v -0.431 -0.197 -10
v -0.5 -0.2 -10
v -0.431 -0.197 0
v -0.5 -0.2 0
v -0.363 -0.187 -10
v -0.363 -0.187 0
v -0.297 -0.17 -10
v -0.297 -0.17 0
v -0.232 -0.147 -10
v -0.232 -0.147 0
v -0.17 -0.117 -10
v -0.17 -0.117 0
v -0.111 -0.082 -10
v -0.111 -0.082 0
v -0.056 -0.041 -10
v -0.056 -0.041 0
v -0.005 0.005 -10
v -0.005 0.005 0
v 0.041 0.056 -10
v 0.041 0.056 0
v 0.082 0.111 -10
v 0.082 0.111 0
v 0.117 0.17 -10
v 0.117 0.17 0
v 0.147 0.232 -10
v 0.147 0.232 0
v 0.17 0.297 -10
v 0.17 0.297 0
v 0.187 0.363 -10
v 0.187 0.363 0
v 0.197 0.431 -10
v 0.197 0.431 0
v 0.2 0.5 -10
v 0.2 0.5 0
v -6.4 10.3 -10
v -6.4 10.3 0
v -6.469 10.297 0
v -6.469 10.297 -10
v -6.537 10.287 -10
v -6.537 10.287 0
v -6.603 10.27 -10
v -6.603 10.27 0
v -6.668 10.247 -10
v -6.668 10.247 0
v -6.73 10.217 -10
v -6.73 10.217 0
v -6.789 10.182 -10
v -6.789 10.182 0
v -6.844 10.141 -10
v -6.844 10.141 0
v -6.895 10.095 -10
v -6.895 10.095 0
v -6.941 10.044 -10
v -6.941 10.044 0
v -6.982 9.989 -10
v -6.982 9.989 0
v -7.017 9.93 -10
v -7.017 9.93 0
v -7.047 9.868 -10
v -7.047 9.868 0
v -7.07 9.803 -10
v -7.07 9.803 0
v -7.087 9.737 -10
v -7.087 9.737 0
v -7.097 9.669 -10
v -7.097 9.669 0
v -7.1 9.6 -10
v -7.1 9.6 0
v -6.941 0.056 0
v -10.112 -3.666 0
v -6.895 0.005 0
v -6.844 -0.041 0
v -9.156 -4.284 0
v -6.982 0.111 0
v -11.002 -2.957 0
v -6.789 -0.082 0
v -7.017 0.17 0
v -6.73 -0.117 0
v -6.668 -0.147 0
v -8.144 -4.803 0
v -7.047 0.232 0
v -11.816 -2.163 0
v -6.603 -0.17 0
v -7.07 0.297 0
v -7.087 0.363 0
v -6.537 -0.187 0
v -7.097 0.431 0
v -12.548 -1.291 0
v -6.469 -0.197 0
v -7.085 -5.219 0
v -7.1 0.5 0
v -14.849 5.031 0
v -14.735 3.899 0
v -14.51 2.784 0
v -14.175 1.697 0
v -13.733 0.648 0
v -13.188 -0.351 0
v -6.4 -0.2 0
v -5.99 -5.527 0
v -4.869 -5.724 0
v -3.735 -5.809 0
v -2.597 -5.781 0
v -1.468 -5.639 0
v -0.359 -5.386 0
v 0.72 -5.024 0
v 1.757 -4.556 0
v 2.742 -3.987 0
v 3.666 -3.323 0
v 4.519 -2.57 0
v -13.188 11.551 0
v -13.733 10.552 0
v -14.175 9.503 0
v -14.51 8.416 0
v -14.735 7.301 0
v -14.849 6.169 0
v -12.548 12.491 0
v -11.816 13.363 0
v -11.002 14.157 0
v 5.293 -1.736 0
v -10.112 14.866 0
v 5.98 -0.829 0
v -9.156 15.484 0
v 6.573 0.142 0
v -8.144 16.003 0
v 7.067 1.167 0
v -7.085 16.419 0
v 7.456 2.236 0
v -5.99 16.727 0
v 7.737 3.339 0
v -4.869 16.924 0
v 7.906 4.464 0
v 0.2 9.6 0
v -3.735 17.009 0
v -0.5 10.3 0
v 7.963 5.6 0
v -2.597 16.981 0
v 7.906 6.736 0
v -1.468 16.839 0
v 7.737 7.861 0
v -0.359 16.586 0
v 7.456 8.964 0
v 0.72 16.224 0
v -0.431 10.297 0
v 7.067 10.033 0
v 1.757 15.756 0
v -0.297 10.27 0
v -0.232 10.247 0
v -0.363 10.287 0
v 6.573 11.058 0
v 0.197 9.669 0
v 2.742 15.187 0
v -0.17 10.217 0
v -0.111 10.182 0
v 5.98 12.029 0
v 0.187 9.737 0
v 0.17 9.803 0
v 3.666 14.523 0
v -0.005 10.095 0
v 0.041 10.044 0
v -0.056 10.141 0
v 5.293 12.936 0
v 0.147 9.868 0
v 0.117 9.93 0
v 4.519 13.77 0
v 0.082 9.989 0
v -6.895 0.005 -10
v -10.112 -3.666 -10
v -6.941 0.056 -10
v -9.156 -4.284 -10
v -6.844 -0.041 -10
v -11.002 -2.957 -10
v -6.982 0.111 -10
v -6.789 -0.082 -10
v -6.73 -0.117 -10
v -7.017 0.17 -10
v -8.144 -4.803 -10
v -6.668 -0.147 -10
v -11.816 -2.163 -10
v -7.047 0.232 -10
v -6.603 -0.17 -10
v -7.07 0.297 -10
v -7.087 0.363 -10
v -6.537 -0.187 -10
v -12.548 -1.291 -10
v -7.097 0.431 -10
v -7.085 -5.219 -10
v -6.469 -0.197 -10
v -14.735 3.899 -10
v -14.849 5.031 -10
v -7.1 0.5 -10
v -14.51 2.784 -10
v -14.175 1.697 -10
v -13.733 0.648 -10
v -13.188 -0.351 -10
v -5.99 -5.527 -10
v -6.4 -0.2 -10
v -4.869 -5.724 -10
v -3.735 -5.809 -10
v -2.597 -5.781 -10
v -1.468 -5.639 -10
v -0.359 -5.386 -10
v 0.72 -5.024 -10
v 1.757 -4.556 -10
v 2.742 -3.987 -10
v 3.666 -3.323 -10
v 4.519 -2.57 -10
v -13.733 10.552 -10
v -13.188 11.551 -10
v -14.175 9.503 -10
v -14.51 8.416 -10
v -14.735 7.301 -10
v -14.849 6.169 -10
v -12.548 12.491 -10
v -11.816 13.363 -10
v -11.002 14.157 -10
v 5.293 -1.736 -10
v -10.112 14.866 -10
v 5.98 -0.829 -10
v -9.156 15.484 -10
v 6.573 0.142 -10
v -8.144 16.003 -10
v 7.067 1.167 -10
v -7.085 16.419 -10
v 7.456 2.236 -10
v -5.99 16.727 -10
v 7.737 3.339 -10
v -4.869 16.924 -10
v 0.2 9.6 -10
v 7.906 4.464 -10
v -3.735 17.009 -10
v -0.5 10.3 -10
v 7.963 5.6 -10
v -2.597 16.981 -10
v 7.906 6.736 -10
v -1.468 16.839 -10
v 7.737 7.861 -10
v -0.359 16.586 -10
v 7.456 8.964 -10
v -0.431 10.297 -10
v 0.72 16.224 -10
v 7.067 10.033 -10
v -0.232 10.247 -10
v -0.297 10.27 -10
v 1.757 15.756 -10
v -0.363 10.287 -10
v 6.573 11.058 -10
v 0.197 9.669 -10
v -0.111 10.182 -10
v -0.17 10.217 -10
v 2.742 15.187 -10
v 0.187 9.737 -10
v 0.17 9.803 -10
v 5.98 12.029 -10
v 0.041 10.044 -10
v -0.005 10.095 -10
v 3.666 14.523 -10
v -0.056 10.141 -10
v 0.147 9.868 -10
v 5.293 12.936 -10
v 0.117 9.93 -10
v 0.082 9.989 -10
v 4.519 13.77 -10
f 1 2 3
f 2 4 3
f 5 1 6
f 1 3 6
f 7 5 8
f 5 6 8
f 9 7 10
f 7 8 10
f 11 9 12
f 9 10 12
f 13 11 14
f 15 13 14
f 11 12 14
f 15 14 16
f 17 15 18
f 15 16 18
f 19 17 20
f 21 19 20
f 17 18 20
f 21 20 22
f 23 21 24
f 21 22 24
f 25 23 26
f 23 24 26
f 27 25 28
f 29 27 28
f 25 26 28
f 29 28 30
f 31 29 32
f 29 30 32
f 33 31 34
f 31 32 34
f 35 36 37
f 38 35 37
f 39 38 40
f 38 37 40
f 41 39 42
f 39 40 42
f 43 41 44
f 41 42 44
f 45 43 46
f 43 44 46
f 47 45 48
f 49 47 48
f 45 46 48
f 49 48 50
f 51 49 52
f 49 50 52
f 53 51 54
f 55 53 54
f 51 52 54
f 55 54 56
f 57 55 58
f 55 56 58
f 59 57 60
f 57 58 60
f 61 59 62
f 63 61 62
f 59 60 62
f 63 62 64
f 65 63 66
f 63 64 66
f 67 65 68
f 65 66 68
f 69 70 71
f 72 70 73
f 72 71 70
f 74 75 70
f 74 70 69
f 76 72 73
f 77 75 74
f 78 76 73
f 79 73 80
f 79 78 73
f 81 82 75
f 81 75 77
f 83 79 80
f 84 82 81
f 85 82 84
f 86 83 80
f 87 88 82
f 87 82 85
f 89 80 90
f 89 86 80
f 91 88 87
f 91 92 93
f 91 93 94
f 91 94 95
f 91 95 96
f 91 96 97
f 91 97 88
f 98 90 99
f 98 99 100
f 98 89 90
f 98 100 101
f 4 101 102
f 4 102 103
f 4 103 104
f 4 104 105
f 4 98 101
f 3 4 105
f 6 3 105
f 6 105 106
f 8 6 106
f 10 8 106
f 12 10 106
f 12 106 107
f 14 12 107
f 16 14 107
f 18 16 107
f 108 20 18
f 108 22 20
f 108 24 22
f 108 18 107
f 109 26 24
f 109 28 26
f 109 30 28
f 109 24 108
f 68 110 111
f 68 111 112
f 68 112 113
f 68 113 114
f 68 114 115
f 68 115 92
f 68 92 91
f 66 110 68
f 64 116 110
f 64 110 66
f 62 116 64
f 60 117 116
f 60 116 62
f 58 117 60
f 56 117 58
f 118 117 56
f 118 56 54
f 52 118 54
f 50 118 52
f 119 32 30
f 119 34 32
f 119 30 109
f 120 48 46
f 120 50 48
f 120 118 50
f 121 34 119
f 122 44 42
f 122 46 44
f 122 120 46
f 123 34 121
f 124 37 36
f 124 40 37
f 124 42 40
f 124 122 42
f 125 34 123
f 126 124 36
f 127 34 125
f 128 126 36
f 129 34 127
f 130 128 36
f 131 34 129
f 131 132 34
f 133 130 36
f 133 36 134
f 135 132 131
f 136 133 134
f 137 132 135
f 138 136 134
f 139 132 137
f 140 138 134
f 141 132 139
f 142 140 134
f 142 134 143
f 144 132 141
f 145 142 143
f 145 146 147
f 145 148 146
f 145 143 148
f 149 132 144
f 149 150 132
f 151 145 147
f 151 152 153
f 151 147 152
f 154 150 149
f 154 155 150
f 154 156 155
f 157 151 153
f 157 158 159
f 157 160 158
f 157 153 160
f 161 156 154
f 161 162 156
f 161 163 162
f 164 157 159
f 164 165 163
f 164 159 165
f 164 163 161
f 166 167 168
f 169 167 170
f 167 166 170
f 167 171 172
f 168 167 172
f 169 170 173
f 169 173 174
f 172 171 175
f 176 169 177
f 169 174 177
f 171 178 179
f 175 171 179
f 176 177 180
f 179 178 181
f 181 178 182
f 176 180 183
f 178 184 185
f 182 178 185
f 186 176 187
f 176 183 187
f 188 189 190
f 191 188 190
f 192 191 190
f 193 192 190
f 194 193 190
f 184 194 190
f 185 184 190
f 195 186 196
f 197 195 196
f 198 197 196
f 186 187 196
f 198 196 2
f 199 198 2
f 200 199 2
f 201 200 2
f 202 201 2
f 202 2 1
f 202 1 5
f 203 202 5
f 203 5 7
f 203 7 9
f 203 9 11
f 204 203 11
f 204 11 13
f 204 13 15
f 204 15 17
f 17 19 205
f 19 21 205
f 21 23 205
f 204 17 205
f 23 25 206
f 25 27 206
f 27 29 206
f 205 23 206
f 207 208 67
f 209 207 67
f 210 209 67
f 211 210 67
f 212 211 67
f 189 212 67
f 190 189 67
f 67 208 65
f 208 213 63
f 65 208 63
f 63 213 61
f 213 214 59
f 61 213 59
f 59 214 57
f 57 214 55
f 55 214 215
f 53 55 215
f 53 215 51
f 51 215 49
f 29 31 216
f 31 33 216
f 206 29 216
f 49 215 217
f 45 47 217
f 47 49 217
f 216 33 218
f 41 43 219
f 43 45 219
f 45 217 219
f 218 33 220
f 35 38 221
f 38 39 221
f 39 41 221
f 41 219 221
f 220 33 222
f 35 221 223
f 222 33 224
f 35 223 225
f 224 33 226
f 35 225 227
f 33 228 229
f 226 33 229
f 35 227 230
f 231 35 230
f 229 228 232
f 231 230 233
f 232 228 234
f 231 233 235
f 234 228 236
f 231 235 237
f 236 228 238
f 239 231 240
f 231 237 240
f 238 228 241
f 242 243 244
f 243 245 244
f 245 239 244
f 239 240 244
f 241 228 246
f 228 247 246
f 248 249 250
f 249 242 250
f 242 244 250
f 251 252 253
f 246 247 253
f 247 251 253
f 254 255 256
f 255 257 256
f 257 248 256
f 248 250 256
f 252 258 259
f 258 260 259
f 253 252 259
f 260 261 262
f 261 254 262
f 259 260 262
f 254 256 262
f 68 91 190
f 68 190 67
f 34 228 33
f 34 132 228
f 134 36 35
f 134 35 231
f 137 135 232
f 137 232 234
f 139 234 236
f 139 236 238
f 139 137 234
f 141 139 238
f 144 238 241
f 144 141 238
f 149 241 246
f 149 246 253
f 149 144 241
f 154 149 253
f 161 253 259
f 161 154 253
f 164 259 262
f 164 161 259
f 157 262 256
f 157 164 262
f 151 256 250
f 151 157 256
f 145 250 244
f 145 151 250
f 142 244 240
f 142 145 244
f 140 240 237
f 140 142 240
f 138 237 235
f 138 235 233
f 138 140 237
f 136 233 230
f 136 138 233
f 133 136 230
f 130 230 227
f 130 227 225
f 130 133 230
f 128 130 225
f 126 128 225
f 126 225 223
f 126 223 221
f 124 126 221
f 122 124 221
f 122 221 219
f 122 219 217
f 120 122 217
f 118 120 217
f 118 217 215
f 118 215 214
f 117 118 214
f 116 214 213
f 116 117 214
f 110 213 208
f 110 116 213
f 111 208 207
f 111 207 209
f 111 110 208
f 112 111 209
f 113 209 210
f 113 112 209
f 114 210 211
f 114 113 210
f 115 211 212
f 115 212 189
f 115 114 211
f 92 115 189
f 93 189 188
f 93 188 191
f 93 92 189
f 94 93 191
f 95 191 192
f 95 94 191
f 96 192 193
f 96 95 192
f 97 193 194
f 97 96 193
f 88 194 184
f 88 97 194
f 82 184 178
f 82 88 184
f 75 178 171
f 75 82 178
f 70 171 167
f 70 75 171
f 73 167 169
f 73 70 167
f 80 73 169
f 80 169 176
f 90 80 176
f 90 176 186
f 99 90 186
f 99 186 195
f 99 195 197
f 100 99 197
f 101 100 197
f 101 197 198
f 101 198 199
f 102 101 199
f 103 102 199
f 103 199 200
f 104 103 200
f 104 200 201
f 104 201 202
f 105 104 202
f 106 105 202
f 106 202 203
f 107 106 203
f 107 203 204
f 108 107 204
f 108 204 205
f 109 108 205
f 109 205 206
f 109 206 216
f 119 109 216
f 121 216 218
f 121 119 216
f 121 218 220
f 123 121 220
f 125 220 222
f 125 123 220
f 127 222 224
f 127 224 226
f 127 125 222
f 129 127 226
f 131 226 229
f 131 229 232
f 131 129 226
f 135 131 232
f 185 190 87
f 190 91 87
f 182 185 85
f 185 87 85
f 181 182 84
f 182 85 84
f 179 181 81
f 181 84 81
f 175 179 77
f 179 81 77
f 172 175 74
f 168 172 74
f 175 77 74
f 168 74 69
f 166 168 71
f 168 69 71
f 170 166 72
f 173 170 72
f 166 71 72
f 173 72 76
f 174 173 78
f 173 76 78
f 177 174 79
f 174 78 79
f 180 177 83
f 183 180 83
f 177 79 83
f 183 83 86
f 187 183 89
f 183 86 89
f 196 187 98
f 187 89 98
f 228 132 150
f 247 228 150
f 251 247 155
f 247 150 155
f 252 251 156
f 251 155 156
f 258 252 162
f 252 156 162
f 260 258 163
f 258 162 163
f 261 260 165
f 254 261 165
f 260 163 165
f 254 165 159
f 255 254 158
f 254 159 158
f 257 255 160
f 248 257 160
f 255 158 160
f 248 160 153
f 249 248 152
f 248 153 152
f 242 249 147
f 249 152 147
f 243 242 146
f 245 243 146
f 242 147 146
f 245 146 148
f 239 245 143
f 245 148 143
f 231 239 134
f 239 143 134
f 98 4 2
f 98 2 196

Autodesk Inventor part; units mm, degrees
ref_plane "YZ Plane" through (0, 0, 0) normal (1, 0, 0) x (0, 1, 0)
ref_plane "XZ Plane" through (0, 0, 0) normal (0, 1, 0) x (-1, 0, 0)
ref_plane "XY Plane" through (0, 0, 0) normal (0, 0, 1) x (1, 0, 0)
sketch "Sketch1" plane through (0, 0, 0) normal (0, 0, 1) x (1, 0, 0)
  line L0 (0, 0.5) -> (0, 9.6) projected
  arc A0 (0, 9.6) -> (-0.5, 10.1) centre (-0.5, 9.6) ccw projected
  line L1 (-0.5, 10.1) -> (-6.4, 10.1) projected
  arc A1 (-6.4, 10.1) -> (-6.9, 9.6) centre (-6.4, 9.6) ccw projected
  line L2 (-6.9, 9.6) -> (-6.9, 0.5) projected
  arc A2 (-6.9, 0.5) -> (-6.4, 0) centre (-6.4, 0.5) ccw projected
  line L3 (-6.4, 0) -> (-0.5, 0) projected
  arc A3 (-0.5, 0) -> (0, 0.5) centre (-0.5, 0.5) ccw projected
  line L4 (-2.6, 8.25) -> (-2.6, 8.8) projected
  line L5 (-1.15, 8.25) -> (-2.6, 8.25) projected
  line L6 (-1.15, 3.65) -> (-1.15, 8.25) projected
  line L7 (-1.8, 3.65) -> (-1.15, 3.65) projected
  line L8 (-1.8, 2.85) -> (-1.8, 3.65) projected
  line L9 (-1.15, 2.85) -> (-1.8, 2.85) projected
  line L10 (-1.15, 1.75) -> (-1.15, 2.85) projected
  line L11 (-2.15, 1.75) -> (-1.15, 1.75) projected
  line L12 (-2.15, 0.75) -> (-2.15, 1.75) projected
  line L13 (-4.75, 0.75) -> (-2.15, 0.75) projected
  line L14 (-4.75, 1.75) -> (-4.75, 0.75) projected
  line L15 (-5.75, 1.75) -> (-4.75, 1.75) projected
  line L16 (-5.75, 2.85) -> (-5.75, 1.75) projected
  line L17 (-5.1, 2.85) -> (-5.75, 2.85) projected
  line L18 (-5.1, 3.65) -> (-5.1, 2.85) projected
  line L19 (-5.75, 3.65) -> (-5.1, 3.65) projected
  line L20 (-5.75, 8.25) -> (-5.75, 3.65) projected
  line L21 (-4.3, 8.25) -> (-5.75, 8.25) projected
  line L22 (-4.3, 8.8) -> (-4.3, 8.25) projected
  line L23 (-2.6, 8.8) -> (-4.3, 8.8) projected
  circle A4 centre (-3.45, 5.6) radius 0.9 projected
  circle A5 centre (-3.45, 5.6) radius 11.4128
  line L24 (-7.1, 0.5) -> (-7.1, 9.6)
  arc A6 (-6.4, 10.3) -> (-7.1, 9.6) centre (-6.4, 9.6) ccw
  line L25 (-6.4, 10.3) -> (-0.5, 10.3)
  arc A7 (0.2, 9.6) -> (-0.5, 10.3) centre (-0.5, 9.6) ccw
  line L26 (0.2, 9.6) -> (0.2, 0.5)
  arc A8 (-0.5, -0.2) -> (0.2, 0.5) centre (-0.5, 0.5) ccw
  line L27 (-0.5, -0.2) -> (-6.4, -0.2)
  arc A9 (-7.1, 0.5) -> (-6.4, -0.2) centre (-6.4, 0.5) ccw
  point P0 (0, 0)
  dimension "d0" = 0.2
extrude "Extrusion1" add sketch "Sketch1" against normal blind 10 contours A5
properties part number "00_SM05LC-toRMS"
